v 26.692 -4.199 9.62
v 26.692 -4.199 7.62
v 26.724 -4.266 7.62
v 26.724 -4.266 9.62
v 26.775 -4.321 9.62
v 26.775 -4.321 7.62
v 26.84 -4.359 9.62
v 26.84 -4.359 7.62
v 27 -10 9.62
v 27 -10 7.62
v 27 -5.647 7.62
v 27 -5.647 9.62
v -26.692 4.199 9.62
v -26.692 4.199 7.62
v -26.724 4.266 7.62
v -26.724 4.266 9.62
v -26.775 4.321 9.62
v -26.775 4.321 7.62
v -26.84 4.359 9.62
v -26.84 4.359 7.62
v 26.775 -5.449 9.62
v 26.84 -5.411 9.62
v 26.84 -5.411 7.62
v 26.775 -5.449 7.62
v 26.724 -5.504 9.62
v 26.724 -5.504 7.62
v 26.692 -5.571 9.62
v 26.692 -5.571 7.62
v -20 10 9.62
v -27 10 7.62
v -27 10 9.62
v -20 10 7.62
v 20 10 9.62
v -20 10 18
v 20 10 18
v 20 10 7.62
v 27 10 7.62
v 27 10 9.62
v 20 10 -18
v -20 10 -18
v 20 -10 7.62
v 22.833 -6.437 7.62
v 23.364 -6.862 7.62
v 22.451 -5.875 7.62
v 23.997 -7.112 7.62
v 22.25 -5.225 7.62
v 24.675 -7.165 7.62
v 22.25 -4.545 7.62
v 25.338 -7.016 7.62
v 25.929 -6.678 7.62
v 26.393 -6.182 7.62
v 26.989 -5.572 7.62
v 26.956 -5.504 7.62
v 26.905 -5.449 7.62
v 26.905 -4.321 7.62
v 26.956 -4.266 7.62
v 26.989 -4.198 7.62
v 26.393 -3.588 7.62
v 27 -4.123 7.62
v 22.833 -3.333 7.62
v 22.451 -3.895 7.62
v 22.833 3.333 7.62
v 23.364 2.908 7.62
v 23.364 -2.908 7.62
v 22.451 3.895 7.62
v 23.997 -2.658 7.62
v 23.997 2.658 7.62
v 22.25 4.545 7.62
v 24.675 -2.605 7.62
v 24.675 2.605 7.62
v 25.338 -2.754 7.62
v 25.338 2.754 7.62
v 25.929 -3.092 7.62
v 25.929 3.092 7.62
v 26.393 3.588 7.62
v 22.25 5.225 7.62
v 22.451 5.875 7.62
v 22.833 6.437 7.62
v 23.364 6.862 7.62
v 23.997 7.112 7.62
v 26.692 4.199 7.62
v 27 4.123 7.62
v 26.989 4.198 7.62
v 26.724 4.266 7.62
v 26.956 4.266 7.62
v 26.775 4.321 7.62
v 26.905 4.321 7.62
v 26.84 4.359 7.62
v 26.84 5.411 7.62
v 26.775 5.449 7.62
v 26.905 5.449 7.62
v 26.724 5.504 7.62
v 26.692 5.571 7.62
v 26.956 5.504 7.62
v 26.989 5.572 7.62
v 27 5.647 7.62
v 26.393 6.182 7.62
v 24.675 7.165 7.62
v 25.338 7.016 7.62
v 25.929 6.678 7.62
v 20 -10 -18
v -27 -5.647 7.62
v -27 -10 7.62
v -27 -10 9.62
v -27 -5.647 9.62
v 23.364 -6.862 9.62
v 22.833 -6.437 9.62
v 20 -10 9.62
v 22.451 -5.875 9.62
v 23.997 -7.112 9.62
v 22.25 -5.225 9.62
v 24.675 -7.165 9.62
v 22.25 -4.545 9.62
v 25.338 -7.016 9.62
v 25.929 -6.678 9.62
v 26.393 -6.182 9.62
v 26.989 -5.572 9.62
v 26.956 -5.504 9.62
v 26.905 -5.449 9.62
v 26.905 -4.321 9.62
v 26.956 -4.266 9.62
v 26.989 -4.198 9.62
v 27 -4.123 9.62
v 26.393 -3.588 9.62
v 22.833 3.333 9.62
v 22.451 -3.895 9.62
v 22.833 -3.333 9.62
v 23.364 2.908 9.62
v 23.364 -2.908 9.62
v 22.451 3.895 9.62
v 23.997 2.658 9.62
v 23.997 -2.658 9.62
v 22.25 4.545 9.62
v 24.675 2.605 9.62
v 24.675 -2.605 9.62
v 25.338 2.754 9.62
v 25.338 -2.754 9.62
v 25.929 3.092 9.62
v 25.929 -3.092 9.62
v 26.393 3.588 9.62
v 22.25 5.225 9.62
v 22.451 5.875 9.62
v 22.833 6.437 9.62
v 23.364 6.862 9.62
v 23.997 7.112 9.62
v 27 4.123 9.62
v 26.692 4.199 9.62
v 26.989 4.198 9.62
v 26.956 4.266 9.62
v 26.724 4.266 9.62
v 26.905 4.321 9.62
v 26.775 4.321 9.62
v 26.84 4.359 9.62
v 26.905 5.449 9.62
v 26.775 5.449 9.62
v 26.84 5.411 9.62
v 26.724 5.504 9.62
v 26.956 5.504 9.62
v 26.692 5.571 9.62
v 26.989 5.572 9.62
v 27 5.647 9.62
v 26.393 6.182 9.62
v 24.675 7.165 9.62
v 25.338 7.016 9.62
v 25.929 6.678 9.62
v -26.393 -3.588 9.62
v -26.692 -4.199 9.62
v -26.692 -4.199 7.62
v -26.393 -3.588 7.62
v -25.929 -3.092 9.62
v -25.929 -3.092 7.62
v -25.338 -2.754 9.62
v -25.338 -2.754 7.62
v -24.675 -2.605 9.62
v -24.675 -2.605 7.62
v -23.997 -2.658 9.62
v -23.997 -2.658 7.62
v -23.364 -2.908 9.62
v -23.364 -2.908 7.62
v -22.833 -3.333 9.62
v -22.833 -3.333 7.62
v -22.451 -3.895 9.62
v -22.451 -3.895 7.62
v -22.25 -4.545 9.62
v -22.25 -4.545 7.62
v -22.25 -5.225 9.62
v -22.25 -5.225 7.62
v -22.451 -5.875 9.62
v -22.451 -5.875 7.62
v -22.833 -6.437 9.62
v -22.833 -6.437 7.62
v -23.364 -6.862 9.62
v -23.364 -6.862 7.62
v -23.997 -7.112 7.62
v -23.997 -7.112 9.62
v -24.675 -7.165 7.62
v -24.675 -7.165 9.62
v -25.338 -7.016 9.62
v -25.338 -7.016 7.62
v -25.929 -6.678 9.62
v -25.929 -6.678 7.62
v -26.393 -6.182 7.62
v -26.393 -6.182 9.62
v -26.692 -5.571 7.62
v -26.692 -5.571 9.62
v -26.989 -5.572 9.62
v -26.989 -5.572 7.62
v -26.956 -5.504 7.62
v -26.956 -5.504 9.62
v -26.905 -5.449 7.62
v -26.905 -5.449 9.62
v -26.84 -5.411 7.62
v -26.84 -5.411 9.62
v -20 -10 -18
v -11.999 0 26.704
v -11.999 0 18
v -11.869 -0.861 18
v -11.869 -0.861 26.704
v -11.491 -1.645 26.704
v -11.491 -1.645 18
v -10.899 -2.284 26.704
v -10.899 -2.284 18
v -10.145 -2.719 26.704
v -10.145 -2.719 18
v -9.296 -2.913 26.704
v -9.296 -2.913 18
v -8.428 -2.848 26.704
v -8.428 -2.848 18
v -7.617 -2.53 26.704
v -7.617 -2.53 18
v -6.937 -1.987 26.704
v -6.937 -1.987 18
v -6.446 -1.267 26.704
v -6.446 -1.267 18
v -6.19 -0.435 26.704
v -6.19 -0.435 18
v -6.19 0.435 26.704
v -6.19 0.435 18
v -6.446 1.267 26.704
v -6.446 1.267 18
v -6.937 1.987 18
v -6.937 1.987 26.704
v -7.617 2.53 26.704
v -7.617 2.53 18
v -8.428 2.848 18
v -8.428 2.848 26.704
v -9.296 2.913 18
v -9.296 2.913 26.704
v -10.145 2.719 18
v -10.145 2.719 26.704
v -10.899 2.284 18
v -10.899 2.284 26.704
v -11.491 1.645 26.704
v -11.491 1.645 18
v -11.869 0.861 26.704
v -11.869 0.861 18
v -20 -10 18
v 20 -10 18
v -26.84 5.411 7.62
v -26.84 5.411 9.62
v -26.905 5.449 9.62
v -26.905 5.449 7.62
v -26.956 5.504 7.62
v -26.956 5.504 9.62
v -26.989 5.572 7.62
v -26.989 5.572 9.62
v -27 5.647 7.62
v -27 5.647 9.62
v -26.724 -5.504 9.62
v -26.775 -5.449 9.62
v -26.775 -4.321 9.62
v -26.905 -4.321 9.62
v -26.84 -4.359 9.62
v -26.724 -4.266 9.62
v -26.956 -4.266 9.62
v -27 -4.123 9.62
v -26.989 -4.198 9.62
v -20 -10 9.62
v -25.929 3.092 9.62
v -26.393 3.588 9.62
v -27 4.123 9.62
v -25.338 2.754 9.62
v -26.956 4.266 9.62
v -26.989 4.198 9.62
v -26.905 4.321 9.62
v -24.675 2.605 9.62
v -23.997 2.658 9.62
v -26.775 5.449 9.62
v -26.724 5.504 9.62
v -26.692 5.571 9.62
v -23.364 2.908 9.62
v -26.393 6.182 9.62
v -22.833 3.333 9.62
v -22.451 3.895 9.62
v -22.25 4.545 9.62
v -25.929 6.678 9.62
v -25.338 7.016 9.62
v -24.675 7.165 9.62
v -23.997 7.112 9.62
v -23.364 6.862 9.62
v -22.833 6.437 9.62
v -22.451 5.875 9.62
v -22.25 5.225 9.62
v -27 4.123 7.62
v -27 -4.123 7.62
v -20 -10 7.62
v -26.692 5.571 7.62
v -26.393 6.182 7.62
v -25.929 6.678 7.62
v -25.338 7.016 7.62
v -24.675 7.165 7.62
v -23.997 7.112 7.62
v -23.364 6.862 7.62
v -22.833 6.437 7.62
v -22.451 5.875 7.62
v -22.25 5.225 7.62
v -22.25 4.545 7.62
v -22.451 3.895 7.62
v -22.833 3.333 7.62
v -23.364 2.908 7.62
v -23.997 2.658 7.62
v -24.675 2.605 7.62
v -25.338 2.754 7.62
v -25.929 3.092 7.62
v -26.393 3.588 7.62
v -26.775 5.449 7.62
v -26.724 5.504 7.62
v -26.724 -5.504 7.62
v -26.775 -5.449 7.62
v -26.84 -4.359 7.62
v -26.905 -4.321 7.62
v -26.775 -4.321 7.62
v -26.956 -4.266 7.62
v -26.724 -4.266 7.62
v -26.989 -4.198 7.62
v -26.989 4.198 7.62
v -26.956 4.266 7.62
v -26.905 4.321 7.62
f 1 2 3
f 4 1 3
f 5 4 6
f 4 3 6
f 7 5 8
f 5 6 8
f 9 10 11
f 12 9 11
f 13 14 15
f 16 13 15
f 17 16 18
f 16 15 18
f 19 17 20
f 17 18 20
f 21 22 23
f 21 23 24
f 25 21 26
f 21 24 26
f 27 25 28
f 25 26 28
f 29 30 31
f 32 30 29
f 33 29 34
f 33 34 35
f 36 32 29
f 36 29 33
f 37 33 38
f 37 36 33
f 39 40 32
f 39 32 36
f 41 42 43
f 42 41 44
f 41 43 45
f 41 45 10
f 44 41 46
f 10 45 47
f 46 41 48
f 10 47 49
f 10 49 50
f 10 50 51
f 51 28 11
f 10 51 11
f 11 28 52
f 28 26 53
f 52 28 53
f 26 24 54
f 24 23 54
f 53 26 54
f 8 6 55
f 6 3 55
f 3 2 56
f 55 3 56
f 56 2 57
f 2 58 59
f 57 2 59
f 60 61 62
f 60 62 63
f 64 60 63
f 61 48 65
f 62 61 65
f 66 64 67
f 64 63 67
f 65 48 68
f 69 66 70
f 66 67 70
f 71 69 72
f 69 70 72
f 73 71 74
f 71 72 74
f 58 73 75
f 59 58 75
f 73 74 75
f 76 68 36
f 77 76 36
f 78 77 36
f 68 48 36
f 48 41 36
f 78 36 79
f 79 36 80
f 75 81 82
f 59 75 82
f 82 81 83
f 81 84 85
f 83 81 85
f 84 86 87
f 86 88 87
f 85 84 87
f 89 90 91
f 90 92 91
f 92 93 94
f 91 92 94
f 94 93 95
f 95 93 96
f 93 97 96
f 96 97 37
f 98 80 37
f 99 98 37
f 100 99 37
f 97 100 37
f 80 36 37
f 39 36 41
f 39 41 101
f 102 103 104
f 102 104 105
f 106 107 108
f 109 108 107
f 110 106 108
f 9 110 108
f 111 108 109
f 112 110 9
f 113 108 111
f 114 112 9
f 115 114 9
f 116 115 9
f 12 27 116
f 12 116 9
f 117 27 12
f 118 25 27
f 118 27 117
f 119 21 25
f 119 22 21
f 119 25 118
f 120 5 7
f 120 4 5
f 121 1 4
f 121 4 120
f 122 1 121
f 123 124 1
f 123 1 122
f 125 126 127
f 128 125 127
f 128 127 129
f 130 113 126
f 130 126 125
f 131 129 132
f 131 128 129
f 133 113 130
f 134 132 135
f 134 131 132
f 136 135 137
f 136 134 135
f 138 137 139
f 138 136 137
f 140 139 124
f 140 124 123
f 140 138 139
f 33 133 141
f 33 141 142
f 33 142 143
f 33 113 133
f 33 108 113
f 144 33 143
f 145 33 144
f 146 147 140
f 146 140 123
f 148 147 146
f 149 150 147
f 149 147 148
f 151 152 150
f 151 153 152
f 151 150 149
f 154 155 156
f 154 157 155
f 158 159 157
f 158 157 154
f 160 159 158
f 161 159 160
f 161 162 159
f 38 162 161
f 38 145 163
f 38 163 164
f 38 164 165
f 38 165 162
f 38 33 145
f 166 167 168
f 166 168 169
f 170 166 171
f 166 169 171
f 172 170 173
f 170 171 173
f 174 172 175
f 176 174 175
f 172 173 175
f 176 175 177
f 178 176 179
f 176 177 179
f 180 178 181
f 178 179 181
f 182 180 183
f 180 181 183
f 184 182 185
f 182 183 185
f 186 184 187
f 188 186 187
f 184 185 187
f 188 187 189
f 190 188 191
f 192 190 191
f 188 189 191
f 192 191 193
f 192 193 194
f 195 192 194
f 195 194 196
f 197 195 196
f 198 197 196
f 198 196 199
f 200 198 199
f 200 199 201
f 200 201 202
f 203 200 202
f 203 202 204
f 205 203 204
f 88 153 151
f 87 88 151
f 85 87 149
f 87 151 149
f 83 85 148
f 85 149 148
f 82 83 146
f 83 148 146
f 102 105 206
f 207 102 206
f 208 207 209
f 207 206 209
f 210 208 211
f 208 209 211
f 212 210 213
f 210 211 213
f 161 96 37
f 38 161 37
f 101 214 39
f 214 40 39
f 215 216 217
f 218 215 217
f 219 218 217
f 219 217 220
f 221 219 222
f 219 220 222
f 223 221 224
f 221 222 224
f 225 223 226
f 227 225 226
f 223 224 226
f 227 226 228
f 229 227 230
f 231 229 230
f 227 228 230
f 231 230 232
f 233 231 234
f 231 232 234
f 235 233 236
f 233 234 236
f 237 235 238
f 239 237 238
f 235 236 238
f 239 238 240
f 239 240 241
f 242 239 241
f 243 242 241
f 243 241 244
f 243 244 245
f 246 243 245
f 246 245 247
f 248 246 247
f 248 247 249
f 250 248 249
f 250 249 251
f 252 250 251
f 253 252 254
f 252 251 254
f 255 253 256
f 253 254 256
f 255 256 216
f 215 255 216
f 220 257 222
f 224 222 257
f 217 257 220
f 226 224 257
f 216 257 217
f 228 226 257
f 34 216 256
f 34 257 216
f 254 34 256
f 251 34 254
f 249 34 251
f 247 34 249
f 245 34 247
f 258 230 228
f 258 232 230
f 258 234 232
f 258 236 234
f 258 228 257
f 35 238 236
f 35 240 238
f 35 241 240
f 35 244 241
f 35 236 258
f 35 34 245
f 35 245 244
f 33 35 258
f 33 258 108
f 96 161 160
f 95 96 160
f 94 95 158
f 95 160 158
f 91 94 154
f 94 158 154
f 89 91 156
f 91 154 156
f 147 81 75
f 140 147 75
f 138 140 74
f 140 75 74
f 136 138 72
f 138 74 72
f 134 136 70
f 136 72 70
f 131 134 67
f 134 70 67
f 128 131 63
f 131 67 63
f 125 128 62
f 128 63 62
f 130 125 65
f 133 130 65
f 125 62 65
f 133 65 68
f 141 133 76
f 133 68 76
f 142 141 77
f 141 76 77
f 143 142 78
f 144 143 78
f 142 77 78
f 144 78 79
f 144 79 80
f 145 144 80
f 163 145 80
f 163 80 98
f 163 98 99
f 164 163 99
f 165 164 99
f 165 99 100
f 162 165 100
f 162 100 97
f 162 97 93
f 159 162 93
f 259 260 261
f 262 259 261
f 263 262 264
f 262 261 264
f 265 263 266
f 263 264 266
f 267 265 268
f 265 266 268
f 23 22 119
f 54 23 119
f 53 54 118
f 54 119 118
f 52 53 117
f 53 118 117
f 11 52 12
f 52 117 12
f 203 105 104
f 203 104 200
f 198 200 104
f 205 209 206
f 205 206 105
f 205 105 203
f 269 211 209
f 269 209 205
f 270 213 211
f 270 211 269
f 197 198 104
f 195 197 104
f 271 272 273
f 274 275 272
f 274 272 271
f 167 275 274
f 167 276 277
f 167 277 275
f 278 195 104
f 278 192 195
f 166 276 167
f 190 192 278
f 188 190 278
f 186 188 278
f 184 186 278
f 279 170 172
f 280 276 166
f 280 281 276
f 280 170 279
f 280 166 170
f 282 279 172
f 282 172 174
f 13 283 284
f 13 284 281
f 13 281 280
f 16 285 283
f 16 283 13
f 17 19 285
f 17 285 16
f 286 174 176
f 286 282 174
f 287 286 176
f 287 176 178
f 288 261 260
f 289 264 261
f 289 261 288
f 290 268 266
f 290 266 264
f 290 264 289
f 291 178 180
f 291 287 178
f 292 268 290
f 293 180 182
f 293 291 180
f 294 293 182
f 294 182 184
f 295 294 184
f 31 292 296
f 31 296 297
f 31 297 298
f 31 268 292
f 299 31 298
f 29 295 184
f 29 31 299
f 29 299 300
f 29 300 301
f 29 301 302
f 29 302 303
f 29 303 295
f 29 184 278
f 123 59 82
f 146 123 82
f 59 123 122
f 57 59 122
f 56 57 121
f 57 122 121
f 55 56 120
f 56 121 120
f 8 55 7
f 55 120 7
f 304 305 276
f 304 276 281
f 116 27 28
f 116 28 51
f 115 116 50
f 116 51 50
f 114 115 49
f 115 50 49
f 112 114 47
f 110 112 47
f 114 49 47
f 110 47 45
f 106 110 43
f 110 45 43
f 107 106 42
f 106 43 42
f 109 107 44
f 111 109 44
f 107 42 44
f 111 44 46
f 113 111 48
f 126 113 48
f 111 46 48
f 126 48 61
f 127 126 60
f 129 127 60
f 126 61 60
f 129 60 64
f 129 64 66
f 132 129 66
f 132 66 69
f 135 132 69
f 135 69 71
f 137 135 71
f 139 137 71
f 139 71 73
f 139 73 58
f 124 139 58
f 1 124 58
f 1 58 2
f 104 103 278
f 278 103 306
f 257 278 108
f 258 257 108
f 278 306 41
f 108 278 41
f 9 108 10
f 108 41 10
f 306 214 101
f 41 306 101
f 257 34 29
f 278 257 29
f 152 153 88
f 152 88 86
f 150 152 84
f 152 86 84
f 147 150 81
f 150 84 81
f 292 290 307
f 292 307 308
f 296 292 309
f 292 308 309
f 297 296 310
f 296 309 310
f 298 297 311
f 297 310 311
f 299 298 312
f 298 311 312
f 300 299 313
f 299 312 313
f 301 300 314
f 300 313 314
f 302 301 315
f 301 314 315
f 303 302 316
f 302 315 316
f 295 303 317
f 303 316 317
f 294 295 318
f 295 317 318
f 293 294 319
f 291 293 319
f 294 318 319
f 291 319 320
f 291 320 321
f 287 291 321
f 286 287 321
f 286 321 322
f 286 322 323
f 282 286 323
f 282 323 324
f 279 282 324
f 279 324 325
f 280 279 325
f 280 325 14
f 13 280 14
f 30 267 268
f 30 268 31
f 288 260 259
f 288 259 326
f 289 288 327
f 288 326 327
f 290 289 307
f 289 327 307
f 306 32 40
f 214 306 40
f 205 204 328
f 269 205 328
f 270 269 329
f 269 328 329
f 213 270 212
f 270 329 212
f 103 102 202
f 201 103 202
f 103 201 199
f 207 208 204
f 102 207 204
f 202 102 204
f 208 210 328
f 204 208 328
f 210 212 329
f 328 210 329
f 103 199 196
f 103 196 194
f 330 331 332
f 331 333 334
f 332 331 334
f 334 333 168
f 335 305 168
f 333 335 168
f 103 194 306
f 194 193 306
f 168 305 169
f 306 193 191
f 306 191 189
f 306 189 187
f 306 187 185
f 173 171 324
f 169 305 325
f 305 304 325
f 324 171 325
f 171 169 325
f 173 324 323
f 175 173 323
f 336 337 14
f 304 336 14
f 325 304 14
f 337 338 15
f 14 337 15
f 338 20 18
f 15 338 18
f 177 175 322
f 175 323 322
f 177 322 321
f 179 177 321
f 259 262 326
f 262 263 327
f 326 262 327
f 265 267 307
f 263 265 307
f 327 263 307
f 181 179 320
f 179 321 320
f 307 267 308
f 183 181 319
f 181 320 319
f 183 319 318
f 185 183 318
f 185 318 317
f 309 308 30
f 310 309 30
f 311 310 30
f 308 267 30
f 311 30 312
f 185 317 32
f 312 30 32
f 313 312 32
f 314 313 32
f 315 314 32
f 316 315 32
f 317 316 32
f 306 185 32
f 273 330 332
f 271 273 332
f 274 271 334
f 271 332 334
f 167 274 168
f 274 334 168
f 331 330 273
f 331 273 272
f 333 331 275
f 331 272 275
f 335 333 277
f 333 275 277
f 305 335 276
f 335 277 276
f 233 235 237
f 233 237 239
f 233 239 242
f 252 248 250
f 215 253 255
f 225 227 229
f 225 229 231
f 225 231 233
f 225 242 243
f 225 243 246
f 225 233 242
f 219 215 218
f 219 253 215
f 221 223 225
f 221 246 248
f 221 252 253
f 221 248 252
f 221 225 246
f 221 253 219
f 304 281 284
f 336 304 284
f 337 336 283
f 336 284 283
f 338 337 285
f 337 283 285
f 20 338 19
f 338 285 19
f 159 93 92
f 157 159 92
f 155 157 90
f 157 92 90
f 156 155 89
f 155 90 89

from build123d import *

# Parameters (mm, degrees)
SKETCH1_W               = 40
SKETCH1_H               = 36
BOSS_EXTRUDE1_DEPTH     = 10
BOSS_EXTRUDE2_START     = 7.62
SKETCH2_W               = 7
SKETCH2_H               = 20
BOSS_EXTRUDE2_DEPTH     = 2
CUT_EXTRUDE1_DEPTH      = 34.955853693
CUT_EXTRUDE1_DEPTH_BACK = 34.955853693
FILLET1_R               = 0.254
BOSS_EXTRUDE4_START     = 18
SKETCH5_R               = 2.921
BOSS_EXTRUDE4_DEPTH     = 8.704


with BuildPart() as part:
    # Sketch1 → Boss-Extrude1 (new, symmetric)
    with BuildSketch(Plane(origin=(0, 0, 0), x_dir=(1, 0, 0), z_dir=(0, 1, 0))):
        Rectangle(SKETCH1_W, SKETCH1_H)
    extrude(amount=BOSS_EXTRUDE1_DEPTH, both=True)

    # Sketch2 → Boss-Extrude2 (add)
    with BuildSketch(Plane.XY.offset(BOSS_EXTRUDE2_START)):
        with Locations((-23.5, 0)):
            Rectangle(SKETCH2_W, SKETCH2_H)
        with Locations((23.5, 0)):
            Rectangle(SKETCH2_W, SKETCH2_H)
    extrude(amount=BOSS_EXTRUDE2_DEPTH)

    # Sketch4 → Cut-Extrude1 (cut, two sides: drawn at the far end of the back side and taken through both)
    with BuildSketch(Plane.XY.offset(-CUT_EXTRUDE1_DEPTH_BACK)):
        with BuildLine():
            Line((-27, 5.393), (-26.739840954, 5.393))
            ThreePointArc((-26.739840954, 5.393), (-22.225, 4.885), (-26.739840954, 4.377))
            Line((-26.739840954, 4.377), (-27, 4.377))
            Line((-27, 4.377), (-27, 5.393))
        make_face()
        with BuildLine():
            Line((27, 4.377), (26.739840954, 4.377))
            ThreePointArc((26.739840954, 4.377), (22.225, 4.885), (26.739840954, 5.393))
            Line((26.739840954, 5.393), (27, 5.393))
            Line((27, 5.393), (27, 4.377))
        make_face()
        with BuildLine():
            Line((27, -5.393), (26.739840954, -5.393))
            ThreePointArc((26.739840954, -5.393), (22.225, -4.885), (26.739840954, -4.377))
            Line((26.739840954, -4.377), (27, -4.377))
            Line((27, -4.377), (27, -5.393))
        make_face()
        with BuildLine():
            Line((-27, -4.377), (-26.739840954, -4.377))
            ThreePointArc((-26.739840954, -4.377), (-22.225, -4.885), (-26.739840954, -5.393))
            Line((-26.739840954, -5.393), (-27, -5.393))
            Line((-27, -5.393), (-27, -4.377))
        make_face()
    extrude(amount=CUT_EXTRUDE1_DEPTH + CUT_EXTRUDE1_DEPTH_BACK, mode=Mode.SUBTRACT)

    # Fillet1
    # the kernel refuses this fillet: 0.254 mm, written as the material it takes off along each edge
    with BuildSketch(Plane(origin=(26.739840954, -5.393, 7.134588457), x_dir=(1, 0, 0), z_dir=(0, 0, 1)), Plane(origin=(26.739840954, 4.377, 7.134588457), x_dir=(1, 0, 0), z_dir=(0, 0, 1))) as fillet1_piece_1:
        with BuildLine():
            CenterArc((0.194164617, -0.254), FILLET1_R, 90, 72.542396876)
            ThreePointArc((-0.04813594, -0.1778), (-0.022276402, -0.089385033), (0, 0))
            Line((0, 0), (0.194164617, 0))
        make_face()
    extrude(amount=2.970823086, mode=Mode.SUBTRACT)
    with BuildSketch(Plane(origin=(27, -4.377, 10.255), x_dir=(-1, 0, 0), z_dir=(0, 0, -1)), Plane(origin=(-27, 5.393, 10.255), x_dir=(0, 1, 0), z_dir=(0, 0, -1)), Plane(origin=(27, 4.377, 10.255), x_dir=(0, -1, 0), z_dir=(0, 0, -1)), Plane(origin=(27, -5.393, 10.255), x_dir=(0, -1, 0), z_dir=(0, 0, -1))) as fillet1_piece_2:
        with BuildLine():
            CenterArc((FILLET1_R, FILLET1_R), FILLET1_R, 180, 90)
            Line((0, FILLET1_R), (0, 0))
            Line((0, 0), (FILLET1_R, 0))
        make_face()
    extrude(amount=3.27, mode=Mode.SUBTRACT)
    with BuildSketch(Plane(origin=(26.739840954, 5.393, 7.134588457), x_dir=(-0.2613232863533324, 0.9652513351503299, 0), z_dir=(0, 0, 1)), Plane(origin=(26.739840954, -4.377, 7.134588457), x_dir=(-0.26132328635333724, 0.9652513351503285, 0), z_dir=(0, 0, 1))) as fillet1_piece_3:
        with BuildLine():
            CenterArc((0.194434103, -0.253793771), FILLET1_R, 92.309007358, 72.542396876)
            Line((-0.050739736, -0.187417656), (0, 0))
            ThreePointArc((0, 0), (0.092100365, -0.001856063), (0.184200729, 0))
        make_face()
    extrude(amount=2.970823086, mode=Mode.SUBTRACT)
    with BuildSketch(Plane(origin=(-27, -5.393, 10.255), x_dir=(0, -1, 0), z_dir=(0, 0, -1)), Plane(origin=(-27, -4.377, 10.255), x_dir=(1, 0, 0), z_dir=(0, 0, -1)), Plane(origin=(-27, 4.377, 10.255), x_dir=(0, -1, 0), z_dir=(0, 0, -1)), Plane(origin=(27, 5.393, 10.255), x_dir=(0, 1, 0), z_dir=(0, 0, -1))) as fillet1_piece_4:
        with BuildLine():
            CenterArc((FILLET1_R, -FILLET1_R), FILLET1_R, 90, 90)
            Line((0, -FILLET1_R), (0, 0))
            Line((0, 0), (FILLET1_R, 0))
        make_face()
    extrude(amount=3.27, mode=Mode.SUBTRACT)
    with BuildSketch(Plane(origin=(-26.739840954, -5.393, 7.134588457), x_dir=(-1, 0, 0), z_dir=(0, 0, 1)), Plane(origin=(-26.739840954, 4.377, 7.134588457), x_dir=(-1, 0, 0), z_dir=(0, 0, 1))) as fillet1_piece_5:
        with BuildLine():
            CenterArc((0.194164617, 0.254), FILLET1_R, 197.457603124, 72.542396876)
            ThreePointArc((-0.04813594, 0.1778), (-0.022276402, 0.089385033), (0, 0))
            Line((0, 0), (0.194164617, 0))
        make_face()
    extrude(amount=2.970823086, mode=Mode.SUBTRACT)
    with BuildSketch(Plane(origin=(-26.739840954, -4.377, 7.134588457), x_dir=(0.2613232863533336, 0.9652513351503295, 0), z_dir=(0, 0, 1)), Plane(origin=(-26.739840954, 5.393, 7.134588457), x_dir=(0.2613232863533336, 0.9652513351503295, 0), z_dir=(0, 0, 1))) as fillet1_piece_6:
        with BuildLine():
            CenterArc((0.194434103, 0.253793771), FILLET1_R, 195.148595765, 72.542396876)
            Line((-0.050739736, 0.187417656), (0, 0))
            ThreePointArc((0, 0), (0.092100365, 0.001856063), (0.184200729, 0))
        make_face()
    extrude(amount=2.970823086, mode=Mode.SUBTRACT)

    # Sketch5 → Boss-Extrude4 (add)
    with BuildSketch(Plane.XY.offset(BOSS_EXTRUDE4_START)):
        with Locations(Location((-9.078, 0, 0), (0, 0, 180))):
            Circle(SKETCH5_R)
    extrude(amount=BOSS_EXTRUDE4_DEPTH)


solid = part.part
